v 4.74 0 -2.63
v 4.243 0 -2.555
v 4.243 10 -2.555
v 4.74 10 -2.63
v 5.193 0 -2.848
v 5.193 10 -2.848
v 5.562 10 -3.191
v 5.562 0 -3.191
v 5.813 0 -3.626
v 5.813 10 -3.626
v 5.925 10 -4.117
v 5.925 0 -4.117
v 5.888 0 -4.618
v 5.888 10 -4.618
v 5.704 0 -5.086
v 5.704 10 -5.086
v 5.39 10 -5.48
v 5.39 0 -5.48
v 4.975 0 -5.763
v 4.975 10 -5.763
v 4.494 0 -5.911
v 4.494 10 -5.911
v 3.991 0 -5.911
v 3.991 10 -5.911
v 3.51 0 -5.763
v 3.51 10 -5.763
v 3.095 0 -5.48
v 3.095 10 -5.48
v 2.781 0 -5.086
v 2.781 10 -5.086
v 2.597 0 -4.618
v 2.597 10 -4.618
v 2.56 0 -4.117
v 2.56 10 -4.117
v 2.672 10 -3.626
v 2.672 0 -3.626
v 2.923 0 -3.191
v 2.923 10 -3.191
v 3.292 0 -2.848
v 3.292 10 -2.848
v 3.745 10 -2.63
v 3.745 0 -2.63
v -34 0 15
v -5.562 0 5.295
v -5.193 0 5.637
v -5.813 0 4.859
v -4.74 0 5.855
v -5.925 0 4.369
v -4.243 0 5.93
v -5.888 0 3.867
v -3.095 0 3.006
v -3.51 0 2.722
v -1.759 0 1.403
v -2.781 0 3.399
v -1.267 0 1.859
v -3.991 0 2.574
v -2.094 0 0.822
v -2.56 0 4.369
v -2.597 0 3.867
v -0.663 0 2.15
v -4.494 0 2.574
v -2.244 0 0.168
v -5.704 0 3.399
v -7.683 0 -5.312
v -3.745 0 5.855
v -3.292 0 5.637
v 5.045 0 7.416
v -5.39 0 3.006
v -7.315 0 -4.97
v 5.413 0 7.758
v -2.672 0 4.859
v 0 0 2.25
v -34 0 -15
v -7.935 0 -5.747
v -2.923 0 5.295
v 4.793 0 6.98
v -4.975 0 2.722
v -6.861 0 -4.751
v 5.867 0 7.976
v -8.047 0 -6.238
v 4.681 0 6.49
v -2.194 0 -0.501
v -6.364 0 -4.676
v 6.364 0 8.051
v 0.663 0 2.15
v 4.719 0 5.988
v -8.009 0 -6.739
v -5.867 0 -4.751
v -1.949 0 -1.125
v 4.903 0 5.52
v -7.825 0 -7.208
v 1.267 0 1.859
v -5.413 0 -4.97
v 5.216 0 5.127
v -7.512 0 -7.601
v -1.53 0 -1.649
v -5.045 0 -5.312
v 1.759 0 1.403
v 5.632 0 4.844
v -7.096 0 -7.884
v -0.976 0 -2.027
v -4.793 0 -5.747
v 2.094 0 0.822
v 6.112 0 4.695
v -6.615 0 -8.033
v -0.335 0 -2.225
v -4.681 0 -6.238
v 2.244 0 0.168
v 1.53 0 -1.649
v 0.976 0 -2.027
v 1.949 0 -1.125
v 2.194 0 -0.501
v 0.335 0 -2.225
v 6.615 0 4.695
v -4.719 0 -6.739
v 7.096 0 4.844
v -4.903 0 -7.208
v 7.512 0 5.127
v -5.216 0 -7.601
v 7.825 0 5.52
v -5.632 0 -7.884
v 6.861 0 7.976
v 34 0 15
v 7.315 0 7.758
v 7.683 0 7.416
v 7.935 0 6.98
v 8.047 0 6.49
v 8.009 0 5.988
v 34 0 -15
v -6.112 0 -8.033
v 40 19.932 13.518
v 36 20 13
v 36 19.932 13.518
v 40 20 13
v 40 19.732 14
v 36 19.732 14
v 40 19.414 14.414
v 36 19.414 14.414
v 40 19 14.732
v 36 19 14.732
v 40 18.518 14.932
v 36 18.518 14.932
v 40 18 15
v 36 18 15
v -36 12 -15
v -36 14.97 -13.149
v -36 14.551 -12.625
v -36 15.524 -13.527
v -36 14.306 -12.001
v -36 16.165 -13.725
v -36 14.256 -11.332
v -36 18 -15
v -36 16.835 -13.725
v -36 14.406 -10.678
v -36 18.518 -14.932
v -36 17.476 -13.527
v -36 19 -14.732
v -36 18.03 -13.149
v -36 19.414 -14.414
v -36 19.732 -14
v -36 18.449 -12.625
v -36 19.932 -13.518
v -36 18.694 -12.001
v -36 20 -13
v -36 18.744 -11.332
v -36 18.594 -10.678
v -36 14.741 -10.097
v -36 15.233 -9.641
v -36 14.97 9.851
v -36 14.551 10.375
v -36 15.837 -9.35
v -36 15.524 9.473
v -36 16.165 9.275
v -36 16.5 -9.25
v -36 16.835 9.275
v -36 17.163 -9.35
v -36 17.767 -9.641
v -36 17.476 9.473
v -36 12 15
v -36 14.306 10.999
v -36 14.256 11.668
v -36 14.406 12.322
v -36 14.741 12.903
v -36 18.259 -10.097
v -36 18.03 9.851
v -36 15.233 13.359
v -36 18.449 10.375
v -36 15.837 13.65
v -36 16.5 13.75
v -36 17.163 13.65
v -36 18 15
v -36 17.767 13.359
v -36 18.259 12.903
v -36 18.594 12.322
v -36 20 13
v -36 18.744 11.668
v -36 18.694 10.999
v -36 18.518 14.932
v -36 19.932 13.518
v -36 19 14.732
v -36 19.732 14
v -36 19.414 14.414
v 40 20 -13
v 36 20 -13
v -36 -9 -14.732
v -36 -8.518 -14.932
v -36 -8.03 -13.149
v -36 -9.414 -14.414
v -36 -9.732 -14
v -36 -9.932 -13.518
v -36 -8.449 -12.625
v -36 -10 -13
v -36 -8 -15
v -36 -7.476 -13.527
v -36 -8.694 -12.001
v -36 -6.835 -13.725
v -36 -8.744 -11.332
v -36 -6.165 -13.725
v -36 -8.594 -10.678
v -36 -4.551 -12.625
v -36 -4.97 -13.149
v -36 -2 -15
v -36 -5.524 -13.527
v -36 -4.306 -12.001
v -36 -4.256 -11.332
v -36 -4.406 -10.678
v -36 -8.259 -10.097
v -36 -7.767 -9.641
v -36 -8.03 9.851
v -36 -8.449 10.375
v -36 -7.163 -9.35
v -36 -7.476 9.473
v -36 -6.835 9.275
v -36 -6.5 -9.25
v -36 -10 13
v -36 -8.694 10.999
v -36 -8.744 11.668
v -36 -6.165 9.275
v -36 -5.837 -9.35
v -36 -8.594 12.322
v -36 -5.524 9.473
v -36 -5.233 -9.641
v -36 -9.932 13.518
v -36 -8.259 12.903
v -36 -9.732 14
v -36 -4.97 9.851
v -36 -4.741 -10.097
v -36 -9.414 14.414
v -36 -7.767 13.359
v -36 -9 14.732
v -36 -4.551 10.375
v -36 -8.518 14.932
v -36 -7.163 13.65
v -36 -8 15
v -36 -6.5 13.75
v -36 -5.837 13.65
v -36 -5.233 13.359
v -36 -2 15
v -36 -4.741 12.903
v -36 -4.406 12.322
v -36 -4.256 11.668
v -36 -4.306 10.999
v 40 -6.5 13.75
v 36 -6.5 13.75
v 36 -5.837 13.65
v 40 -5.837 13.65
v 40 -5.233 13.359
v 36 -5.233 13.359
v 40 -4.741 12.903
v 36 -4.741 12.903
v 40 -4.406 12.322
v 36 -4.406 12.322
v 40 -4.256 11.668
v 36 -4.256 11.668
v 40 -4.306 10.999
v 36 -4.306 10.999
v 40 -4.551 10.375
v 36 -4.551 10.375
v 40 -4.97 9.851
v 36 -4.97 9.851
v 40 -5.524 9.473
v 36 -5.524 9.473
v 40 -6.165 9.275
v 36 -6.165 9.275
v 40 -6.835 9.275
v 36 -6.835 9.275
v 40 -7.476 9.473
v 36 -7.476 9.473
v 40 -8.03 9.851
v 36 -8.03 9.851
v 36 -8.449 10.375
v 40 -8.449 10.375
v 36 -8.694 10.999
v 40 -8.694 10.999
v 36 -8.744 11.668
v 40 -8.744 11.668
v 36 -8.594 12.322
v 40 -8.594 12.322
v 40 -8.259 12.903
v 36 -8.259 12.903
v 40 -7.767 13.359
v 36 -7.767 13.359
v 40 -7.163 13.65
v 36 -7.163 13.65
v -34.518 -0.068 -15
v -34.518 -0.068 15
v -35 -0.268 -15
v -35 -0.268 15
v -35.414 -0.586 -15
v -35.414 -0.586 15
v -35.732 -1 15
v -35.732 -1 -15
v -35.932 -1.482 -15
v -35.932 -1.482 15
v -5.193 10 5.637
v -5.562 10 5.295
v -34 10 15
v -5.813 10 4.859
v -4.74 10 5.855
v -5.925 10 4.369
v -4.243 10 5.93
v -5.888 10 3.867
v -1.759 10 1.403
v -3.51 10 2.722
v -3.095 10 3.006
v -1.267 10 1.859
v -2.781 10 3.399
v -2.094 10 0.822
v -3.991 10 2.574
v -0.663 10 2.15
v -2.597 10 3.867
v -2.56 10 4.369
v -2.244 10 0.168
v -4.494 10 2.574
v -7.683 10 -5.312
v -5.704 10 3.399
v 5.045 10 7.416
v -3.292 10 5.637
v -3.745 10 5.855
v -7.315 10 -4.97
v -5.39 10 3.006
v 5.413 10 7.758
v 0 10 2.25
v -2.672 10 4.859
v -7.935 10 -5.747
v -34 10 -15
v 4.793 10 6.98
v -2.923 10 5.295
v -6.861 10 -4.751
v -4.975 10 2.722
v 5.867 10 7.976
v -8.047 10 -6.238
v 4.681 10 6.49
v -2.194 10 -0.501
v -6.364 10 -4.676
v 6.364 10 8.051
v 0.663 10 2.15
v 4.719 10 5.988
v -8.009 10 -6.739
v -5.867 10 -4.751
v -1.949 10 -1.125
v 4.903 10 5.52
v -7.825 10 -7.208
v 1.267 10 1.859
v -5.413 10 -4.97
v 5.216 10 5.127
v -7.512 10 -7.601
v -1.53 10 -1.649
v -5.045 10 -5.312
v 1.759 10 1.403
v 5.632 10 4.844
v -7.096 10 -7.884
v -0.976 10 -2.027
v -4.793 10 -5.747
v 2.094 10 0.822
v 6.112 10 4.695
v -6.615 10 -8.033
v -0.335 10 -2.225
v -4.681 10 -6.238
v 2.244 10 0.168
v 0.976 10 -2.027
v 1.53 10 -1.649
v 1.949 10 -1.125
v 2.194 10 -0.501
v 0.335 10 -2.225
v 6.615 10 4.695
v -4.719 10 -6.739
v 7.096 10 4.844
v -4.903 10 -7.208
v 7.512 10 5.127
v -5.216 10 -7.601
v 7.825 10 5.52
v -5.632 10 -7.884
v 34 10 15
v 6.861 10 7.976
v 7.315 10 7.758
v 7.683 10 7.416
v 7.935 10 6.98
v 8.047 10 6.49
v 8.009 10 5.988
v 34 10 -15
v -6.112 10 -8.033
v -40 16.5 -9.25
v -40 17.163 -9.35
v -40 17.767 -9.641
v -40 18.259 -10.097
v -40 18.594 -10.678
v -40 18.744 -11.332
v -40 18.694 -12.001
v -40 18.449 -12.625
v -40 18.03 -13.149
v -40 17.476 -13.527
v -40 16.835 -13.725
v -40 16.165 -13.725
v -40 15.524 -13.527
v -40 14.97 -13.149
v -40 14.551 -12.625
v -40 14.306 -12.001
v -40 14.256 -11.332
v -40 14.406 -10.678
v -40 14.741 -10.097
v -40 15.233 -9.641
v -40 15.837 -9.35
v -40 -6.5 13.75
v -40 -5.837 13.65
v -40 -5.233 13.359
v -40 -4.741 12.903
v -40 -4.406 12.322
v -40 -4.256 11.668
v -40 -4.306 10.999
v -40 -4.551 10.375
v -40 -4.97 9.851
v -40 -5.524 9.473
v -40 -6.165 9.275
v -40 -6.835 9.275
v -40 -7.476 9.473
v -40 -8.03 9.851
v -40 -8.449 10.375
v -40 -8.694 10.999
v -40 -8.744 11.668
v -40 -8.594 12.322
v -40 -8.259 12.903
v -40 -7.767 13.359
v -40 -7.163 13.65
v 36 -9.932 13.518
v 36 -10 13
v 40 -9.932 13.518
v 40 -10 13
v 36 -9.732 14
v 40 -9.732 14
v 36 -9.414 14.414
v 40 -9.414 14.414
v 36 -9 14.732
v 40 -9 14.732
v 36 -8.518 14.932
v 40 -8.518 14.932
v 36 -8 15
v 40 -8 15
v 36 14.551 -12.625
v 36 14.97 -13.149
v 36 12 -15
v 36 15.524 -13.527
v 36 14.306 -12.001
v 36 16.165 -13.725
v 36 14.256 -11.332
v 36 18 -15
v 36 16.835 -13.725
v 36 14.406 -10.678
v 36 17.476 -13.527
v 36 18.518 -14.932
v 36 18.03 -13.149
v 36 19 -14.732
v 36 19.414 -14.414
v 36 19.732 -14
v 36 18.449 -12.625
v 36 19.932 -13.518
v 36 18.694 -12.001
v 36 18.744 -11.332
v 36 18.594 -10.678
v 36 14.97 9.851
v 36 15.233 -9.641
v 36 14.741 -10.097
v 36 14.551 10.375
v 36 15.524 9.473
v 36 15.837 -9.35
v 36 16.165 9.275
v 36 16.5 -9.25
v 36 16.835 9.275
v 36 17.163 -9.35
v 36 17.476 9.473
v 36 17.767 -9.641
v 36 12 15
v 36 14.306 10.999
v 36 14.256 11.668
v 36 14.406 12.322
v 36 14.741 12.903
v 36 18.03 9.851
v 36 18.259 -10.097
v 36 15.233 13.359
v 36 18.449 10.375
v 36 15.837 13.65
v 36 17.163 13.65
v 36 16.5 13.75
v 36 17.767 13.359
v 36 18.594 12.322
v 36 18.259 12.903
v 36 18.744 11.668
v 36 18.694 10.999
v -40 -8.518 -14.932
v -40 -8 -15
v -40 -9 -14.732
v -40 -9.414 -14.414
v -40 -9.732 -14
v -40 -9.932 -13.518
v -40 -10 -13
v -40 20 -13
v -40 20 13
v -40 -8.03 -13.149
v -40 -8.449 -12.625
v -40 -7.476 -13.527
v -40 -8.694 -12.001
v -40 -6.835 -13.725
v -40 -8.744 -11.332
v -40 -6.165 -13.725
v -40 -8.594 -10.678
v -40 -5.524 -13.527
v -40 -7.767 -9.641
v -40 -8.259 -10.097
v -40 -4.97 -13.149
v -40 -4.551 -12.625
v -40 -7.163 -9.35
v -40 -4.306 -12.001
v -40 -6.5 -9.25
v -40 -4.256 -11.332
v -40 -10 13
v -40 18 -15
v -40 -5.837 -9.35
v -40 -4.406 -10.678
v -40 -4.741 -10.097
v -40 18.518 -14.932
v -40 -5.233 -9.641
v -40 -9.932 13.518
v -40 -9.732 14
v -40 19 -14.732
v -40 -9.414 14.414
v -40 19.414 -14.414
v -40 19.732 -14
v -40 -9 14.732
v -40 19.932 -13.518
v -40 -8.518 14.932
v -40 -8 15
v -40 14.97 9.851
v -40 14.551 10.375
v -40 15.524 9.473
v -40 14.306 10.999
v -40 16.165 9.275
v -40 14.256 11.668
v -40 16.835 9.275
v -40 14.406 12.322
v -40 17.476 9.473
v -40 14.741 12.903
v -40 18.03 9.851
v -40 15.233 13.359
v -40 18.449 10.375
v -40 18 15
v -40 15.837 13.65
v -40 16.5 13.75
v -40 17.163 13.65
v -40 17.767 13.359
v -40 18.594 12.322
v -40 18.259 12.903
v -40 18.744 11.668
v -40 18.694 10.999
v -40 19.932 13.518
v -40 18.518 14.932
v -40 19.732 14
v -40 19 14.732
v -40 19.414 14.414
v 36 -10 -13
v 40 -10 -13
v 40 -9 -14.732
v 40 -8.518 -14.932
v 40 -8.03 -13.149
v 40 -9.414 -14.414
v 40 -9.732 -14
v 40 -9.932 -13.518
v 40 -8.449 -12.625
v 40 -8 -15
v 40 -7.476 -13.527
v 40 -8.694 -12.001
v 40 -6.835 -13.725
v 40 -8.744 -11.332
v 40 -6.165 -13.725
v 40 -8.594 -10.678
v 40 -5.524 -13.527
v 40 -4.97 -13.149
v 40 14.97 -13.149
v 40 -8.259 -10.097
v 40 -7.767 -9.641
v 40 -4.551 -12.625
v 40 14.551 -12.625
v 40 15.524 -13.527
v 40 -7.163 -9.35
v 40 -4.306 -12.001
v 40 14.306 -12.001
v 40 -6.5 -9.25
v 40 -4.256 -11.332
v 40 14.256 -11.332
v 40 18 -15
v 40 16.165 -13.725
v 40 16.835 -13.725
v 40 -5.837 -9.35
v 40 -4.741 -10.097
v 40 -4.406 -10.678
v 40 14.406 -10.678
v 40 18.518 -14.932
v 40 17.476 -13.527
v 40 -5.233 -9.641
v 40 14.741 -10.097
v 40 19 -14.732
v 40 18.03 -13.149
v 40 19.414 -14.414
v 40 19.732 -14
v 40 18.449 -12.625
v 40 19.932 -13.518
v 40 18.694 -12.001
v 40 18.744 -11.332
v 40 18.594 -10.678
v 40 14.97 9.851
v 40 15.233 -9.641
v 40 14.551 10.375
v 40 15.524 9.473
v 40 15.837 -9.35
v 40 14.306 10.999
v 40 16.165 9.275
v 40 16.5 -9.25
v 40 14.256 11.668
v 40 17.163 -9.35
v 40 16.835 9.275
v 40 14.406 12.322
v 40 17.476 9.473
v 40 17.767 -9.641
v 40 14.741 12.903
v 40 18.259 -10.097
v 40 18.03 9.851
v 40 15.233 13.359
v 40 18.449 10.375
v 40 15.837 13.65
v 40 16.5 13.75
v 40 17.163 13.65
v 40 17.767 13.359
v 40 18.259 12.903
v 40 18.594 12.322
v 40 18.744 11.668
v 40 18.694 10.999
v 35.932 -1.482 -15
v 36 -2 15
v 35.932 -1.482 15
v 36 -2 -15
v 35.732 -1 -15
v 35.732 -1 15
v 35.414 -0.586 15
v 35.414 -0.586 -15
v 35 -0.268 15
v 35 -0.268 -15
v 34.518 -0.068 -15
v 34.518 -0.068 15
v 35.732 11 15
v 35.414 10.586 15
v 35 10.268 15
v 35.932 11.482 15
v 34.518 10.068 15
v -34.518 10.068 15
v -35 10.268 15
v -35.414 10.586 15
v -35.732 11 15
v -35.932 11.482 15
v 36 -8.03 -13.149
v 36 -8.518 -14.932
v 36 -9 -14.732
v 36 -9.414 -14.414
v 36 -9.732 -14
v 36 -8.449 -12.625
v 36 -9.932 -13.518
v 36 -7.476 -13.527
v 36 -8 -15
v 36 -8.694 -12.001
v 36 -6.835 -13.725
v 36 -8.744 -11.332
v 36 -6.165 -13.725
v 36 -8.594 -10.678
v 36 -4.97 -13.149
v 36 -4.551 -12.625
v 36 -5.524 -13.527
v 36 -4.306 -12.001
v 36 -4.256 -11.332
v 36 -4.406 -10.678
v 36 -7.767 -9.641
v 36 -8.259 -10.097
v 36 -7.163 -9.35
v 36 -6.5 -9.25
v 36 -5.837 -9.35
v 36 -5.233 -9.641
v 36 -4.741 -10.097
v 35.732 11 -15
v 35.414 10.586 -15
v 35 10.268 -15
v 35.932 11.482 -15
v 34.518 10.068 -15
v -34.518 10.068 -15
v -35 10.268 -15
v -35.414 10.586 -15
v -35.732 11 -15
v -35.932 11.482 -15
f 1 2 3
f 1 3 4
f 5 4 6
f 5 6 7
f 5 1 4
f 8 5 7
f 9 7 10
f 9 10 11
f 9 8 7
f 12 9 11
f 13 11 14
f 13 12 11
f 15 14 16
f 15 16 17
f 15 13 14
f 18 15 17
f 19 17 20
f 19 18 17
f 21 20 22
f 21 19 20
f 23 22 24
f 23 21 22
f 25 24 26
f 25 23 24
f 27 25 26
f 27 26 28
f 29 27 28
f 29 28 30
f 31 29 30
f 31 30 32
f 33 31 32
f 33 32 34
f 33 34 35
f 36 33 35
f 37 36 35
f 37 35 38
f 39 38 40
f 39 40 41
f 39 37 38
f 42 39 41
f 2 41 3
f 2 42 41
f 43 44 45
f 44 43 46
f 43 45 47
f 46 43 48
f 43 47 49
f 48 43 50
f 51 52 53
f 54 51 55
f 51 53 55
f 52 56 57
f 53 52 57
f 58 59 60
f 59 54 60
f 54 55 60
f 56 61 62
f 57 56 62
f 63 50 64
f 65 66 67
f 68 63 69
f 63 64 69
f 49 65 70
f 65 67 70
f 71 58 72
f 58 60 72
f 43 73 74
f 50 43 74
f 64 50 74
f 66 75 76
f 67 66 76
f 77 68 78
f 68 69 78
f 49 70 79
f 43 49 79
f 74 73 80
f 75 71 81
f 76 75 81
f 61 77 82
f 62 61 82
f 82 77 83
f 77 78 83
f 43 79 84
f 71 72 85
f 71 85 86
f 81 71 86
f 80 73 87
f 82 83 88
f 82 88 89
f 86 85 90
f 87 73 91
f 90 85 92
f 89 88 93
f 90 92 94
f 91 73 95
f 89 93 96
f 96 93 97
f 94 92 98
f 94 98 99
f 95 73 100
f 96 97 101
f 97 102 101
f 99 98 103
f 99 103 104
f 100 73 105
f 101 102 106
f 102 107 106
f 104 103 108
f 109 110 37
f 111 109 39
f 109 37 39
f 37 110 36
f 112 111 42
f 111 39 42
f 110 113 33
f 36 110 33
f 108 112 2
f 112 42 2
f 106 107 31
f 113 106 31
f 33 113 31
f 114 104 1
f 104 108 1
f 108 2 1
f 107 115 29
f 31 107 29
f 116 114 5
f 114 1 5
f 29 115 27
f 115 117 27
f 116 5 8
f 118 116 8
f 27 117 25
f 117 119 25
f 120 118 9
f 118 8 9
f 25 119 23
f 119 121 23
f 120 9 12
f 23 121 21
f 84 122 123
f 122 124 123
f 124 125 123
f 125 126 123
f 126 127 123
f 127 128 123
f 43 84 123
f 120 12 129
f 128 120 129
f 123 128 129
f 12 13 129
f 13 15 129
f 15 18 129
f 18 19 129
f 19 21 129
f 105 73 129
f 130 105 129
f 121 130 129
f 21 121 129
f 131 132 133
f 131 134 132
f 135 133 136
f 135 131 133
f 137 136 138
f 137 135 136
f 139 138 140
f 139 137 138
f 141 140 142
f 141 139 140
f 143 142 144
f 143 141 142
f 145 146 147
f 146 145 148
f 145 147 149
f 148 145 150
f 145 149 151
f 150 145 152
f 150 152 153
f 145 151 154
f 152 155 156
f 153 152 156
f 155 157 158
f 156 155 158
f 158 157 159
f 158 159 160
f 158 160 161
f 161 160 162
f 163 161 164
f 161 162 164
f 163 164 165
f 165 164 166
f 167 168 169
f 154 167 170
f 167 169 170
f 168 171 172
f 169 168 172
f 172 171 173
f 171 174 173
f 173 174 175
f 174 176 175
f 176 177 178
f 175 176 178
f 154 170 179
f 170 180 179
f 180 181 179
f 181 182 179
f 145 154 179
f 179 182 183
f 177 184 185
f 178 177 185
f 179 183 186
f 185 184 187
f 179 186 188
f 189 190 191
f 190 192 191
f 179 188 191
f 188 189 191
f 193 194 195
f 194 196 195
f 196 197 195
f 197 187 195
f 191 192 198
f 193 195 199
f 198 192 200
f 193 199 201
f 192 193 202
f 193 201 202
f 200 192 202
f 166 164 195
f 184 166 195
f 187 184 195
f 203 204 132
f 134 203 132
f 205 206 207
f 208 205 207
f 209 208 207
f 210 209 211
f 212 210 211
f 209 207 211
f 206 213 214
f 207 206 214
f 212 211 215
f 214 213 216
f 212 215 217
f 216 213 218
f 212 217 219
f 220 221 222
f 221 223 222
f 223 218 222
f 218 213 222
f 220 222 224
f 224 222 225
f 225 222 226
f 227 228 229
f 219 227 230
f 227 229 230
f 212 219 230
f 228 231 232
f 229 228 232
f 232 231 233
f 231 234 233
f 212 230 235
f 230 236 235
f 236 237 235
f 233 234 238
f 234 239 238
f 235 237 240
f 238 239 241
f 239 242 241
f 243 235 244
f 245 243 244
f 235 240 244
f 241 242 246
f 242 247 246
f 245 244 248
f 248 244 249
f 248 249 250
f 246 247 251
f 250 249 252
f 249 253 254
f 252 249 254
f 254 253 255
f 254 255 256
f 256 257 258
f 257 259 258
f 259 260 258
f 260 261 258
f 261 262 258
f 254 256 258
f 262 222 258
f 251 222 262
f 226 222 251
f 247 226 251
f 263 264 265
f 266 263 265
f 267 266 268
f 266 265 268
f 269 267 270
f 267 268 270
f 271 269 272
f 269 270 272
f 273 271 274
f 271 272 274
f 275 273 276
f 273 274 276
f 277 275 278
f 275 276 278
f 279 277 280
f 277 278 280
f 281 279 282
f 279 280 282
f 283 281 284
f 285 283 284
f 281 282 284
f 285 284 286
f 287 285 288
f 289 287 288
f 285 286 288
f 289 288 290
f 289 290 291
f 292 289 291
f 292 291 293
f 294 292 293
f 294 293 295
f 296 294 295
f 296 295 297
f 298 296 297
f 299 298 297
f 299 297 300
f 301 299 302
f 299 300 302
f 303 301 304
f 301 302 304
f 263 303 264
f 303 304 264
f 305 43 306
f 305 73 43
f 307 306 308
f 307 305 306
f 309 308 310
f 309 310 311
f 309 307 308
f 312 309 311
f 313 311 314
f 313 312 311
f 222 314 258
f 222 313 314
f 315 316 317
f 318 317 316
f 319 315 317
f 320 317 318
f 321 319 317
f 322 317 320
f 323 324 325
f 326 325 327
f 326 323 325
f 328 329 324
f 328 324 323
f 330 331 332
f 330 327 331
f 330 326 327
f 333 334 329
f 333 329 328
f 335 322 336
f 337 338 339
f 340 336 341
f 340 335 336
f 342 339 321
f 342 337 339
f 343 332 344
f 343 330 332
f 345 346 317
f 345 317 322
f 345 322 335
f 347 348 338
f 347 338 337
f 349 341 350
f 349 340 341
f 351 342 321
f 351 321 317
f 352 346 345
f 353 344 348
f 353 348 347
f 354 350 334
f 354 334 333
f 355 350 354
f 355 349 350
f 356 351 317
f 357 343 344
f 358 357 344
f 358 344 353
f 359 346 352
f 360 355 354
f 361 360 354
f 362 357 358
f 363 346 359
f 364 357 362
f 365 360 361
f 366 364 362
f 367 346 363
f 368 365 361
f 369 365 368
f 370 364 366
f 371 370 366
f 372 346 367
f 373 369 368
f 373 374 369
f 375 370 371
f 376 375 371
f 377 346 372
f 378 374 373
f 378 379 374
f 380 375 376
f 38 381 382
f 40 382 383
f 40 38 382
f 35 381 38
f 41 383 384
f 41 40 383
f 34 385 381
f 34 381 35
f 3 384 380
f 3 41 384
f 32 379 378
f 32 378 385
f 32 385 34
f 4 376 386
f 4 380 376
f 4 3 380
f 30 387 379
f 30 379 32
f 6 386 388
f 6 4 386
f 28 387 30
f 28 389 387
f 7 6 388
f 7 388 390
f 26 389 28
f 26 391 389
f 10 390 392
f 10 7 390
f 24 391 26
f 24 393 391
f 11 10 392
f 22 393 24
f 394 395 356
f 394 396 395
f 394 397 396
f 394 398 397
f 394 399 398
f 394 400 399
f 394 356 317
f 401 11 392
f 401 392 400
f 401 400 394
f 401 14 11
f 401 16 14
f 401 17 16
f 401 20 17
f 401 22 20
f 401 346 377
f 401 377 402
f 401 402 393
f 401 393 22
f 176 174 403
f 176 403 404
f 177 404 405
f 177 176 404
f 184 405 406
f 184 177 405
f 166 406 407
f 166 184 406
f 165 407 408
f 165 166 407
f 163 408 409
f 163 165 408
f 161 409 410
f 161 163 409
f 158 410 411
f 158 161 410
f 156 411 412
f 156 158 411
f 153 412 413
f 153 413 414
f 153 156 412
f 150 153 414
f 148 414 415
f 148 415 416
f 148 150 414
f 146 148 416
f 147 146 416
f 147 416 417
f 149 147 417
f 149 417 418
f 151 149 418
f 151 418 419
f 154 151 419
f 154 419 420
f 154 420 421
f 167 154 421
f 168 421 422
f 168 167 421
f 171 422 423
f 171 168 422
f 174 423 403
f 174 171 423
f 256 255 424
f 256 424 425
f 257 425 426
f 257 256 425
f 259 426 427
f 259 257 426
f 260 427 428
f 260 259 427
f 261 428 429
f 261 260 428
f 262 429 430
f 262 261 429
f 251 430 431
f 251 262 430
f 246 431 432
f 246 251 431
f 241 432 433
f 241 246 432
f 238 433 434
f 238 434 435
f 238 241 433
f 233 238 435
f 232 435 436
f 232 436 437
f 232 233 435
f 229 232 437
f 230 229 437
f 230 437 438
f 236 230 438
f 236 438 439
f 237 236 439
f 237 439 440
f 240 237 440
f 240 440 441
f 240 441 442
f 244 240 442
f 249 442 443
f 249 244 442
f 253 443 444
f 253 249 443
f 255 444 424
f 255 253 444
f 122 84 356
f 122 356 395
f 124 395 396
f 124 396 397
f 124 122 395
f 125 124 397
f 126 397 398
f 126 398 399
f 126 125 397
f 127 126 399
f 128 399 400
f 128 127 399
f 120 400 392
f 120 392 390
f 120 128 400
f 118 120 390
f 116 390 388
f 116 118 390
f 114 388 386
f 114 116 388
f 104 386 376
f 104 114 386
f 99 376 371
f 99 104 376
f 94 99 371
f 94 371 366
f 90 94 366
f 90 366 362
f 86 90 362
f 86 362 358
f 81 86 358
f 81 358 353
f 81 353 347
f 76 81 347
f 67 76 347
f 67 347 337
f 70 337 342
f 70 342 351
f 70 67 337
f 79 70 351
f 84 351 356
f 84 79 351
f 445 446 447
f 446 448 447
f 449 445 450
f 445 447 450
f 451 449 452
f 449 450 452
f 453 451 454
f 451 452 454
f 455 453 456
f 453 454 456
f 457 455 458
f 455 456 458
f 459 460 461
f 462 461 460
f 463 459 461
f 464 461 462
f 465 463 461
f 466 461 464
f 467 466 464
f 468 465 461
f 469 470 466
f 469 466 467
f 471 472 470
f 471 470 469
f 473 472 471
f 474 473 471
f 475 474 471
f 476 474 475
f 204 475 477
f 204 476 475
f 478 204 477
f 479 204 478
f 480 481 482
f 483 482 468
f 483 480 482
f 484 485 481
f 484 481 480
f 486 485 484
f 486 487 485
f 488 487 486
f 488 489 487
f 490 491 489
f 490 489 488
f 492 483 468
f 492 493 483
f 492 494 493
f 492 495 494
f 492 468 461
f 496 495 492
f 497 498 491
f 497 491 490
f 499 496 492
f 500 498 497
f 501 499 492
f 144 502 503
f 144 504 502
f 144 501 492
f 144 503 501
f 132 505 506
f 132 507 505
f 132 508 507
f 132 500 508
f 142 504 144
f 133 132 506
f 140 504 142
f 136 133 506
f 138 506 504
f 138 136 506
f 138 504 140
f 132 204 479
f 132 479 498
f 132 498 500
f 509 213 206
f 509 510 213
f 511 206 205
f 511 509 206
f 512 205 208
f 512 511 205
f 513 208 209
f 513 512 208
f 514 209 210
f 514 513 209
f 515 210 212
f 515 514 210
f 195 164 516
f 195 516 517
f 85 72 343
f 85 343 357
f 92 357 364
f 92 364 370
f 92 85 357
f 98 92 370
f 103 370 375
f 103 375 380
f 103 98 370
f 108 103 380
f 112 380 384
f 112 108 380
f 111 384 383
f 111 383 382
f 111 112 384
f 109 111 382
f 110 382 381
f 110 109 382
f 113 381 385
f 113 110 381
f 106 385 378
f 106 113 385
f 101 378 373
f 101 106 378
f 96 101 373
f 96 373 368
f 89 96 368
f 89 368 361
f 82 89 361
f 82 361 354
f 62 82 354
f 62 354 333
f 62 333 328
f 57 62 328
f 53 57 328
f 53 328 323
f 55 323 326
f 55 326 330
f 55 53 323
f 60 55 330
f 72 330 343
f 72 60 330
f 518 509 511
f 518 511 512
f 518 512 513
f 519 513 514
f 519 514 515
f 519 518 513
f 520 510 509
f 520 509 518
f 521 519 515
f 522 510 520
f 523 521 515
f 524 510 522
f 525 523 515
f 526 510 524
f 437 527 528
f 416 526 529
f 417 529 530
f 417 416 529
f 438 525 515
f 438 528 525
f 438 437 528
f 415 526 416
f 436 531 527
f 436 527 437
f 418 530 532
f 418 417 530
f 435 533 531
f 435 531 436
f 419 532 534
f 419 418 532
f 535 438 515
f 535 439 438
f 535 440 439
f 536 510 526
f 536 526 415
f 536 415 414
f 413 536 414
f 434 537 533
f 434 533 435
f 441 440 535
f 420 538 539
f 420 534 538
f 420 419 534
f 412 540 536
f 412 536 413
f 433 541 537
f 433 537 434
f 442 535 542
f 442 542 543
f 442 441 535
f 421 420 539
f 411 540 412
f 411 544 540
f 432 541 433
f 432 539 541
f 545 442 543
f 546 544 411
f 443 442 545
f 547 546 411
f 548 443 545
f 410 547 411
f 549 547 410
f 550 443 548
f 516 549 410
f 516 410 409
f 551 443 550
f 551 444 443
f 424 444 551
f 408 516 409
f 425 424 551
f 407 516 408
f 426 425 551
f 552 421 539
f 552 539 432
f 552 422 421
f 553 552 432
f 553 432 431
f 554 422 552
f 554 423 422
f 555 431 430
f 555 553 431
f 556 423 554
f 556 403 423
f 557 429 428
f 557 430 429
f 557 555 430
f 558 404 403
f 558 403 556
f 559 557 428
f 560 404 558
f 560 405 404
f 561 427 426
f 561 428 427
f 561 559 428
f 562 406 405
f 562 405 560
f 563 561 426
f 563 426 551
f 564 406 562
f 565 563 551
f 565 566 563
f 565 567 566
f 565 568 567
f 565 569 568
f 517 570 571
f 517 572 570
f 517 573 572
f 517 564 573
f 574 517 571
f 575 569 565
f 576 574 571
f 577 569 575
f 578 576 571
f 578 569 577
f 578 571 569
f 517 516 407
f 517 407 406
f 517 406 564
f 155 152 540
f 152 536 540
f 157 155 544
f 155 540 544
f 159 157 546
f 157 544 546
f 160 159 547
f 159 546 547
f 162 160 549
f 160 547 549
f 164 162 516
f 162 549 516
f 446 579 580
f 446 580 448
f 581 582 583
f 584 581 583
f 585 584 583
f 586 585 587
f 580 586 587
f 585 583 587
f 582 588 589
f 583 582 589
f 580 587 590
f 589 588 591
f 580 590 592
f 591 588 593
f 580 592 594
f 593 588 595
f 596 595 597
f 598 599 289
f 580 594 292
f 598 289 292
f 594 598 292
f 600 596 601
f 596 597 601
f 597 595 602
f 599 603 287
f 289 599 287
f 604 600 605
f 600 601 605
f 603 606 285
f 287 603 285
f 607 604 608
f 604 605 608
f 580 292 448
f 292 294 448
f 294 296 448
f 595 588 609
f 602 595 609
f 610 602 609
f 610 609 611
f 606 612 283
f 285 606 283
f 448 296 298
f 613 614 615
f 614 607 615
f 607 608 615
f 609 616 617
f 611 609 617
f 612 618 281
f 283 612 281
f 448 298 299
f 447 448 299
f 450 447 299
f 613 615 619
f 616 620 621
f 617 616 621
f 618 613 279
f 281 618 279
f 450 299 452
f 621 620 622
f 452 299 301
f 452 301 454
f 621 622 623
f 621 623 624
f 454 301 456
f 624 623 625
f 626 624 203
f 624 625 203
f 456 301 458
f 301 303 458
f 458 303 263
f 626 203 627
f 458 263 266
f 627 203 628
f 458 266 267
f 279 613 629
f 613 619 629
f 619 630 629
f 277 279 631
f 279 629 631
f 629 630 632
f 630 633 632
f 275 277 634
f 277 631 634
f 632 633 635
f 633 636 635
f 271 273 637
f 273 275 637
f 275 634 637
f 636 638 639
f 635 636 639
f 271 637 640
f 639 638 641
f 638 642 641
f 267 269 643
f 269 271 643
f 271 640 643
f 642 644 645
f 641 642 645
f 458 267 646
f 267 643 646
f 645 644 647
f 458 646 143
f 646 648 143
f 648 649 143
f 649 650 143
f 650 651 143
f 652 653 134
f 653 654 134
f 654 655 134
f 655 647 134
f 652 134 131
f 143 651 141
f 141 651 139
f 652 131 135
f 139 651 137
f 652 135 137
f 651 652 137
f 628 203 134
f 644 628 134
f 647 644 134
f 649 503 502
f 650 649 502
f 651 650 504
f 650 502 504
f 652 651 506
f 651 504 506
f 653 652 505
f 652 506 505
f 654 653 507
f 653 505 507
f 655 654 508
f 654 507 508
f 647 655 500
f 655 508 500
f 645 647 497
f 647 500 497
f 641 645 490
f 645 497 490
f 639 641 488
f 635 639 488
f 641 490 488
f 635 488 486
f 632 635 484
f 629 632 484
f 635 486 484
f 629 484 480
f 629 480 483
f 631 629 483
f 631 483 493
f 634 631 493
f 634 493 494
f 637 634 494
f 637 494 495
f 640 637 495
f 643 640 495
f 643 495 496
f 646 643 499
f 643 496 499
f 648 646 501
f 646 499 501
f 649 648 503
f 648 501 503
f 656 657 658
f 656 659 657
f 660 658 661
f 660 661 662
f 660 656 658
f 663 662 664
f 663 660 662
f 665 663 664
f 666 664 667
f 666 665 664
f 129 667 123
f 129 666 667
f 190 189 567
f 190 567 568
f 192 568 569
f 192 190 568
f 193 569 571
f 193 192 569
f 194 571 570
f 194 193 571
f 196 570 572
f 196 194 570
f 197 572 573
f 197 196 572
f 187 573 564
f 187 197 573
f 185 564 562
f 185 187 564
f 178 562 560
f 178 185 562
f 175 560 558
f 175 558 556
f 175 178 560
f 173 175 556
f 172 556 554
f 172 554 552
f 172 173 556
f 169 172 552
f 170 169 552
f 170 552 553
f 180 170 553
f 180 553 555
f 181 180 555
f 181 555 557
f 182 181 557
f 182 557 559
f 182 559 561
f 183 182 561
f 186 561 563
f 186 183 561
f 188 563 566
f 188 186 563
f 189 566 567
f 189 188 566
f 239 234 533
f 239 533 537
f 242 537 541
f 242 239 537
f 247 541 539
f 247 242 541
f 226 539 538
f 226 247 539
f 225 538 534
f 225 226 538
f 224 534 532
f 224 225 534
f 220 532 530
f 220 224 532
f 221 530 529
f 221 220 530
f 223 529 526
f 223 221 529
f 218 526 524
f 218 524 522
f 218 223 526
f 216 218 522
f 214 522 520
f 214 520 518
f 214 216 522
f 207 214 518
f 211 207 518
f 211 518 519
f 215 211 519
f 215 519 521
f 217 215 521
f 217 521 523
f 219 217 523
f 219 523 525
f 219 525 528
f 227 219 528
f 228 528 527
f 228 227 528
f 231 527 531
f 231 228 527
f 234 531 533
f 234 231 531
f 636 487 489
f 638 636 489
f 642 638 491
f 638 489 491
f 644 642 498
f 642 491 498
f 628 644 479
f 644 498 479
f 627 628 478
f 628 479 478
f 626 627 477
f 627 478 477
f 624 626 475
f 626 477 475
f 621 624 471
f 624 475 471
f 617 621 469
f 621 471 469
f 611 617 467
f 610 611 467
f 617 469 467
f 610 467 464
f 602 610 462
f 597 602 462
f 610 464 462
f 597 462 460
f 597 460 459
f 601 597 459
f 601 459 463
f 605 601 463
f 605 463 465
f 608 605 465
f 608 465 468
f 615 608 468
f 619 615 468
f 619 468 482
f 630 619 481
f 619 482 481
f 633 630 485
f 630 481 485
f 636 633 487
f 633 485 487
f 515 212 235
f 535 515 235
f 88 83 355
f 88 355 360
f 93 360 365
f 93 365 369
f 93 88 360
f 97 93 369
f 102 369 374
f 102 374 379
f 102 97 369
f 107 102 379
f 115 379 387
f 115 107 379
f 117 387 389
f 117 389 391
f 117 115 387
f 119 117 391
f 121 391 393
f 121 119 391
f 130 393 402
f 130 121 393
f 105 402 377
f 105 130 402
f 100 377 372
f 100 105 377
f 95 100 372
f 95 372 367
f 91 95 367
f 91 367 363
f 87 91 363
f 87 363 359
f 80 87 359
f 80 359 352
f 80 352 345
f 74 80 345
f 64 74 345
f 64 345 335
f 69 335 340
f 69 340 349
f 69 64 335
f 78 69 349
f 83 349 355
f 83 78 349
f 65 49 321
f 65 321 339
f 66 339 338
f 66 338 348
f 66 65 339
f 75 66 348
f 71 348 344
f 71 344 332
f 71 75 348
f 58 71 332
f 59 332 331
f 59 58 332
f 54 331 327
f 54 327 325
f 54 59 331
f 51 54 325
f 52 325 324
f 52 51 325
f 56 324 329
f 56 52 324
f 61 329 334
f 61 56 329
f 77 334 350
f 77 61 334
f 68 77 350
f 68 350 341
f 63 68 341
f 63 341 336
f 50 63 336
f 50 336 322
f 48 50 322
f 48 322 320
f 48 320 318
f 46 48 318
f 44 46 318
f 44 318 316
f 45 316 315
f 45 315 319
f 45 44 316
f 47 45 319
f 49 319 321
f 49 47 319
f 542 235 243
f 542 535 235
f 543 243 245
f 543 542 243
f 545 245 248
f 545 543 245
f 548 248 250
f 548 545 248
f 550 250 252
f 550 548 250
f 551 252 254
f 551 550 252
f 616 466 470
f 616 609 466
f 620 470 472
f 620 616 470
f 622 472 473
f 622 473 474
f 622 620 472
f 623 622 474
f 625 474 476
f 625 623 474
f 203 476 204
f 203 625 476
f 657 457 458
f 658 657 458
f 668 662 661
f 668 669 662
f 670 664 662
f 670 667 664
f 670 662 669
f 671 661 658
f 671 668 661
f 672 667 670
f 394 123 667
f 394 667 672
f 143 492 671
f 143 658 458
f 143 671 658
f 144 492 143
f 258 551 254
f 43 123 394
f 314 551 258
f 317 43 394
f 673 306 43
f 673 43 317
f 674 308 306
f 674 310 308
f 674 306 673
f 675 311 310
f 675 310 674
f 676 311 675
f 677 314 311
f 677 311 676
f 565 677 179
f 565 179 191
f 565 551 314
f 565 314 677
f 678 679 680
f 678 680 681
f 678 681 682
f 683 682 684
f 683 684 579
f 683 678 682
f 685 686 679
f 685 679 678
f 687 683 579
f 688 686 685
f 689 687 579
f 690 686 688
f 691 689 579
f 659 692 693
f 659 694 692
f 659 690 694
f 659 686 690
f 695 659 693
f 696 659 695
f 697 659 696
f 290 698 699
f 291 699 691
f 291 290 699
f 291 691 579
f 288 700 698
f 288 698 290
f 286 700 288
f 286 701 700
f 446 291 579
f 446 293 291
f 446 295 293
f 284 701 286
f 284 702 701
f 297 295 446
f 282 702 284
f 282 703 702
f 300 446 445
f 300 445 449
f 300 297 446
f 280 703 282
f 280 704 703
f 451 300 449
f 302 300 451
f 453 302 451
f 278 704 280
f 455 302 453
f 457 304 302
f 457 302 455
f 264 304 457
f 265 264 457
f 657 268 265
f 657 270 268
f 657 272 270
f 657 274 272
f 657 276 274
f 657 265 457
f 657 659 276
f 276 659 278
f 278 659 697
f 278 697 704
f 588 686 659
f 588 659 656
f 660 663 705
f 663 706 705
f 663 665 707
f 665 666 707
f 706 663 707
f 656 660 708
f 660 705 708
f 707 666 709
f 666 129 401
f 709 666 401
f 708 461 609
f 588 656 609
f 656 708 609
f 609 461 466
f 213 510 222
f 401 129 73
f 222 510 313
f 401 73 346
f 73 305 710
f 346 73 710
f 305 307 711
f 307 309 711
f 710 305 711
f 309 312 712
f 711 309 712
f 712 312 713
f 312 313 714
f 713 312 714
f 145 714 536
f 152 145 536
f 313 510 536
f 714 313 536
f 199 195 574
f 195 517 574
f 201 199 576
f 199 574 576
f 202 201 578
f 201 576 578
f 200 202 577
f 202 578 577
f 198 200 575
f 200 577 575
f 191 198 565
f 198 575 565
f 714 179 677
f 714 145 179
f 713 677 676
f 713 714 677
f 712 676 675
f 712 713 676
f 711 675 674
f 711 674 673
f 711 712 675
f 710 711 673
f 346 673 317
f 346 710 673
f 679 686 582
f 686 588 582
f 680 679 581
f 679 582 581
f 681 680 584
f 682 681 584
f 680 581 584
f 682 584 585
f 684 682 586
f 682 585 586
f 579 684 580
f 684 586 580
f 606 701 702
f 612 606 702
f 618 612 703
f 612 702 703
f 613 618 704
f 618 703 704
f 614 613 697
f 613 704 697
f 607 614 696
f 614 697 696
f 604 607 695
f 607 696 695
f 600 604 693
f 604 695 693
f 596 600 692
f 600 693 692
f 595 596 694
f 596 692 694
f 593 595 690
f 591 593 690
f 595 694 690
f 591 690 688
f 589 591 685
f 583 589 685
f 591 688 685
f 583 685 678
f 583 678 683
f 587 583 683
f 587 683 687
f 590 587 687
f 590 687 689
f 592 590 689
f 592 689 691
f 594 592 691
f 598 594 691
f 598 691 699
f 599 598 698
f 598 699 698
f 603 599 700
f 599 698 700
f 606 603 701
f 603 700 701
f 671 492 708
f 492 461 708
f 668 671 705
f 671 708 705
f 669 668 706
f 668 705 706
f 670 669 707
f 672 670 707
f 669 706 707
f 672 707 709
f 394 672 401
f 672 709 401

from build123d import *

# Parameters (mm, degrees)
SKETCH2_W           = 72
SKETCH2_H           = 30
SKETCH2_R           = 2.25
SKETCH2_R_2         = 1.6875
BOSS_EXTRUDE1_DEPTH = 10
SKETCH3_W           = 30
SKETCH3_H           = 30
SKETCH3_R           = 2.25
BOSS_EXTRUDE2_DEPTH = 4
FILLET1_R           = 2
FILLET2_R           = 2


with BuildPart() as part:
    # Sketch2 → Boss-Extrude1 (new body)
    with BuildSketch(Plane(origin=(0, 0, 0), x_dir=(1, 0, 0), z_dir=(0, 1, 0))):
        Rectangle(SKETCH2_W, SKETCH2_H)
        with Locations(Location((0, 0, 0), (0, 0, 270))):
            Circle(SKETCH2_R, mode=Mode.SUBTRACT)
        with Locations(Location((-6.363961031, 6.363961031, 0), (0, 0, 270))):
            Circle(SKETCH2_R_2, mode=Mode.SUBTRACT)
        with Locations(Location((6.363961031, -6.363961031, 0), (0, 0, 270))):
            Circle(SKETCH2_R_2, mode=Mode.SUBTRACT)
        with Locations(Location((4.242640687, 4.242640687, 0), (0, 0, 270))):
            Circle(SKETCH2_R_2, mode=Mode.SUBTRACT)
        with Locations(Location((-4.242640687, -4.242640687, 0), (0, 0, 270))):
            Circle(SKETCH2_R_2, mode=Mode.SUBTRACT)
    extrude(amount=BOSS_EXTRUDE1_DEPTH)

    # Sketch3 → Boss-Extrude2 (add)
    with BuildSketch(Plane.ZY.offset(36)):
        with Locations((0, 5)):
            Rectangle(SKETCH3_W, SKETCH3_H)
        with Locations((-11.5, 16.5)):
            Circle(SKETCH3_R, mode=Mode.SUBTRACT)
        with Locations((-11.5, -6.5)):
            Circle(SKETCH3_R, mode=Mode.SUBTRACT)
        with Locations((11.5, -6.5)):
            Circle(SKETCH3_R, mode=Mode.SUBTRACT)
        with Locations((11.5, 16.5)):
            Circle(SKETCH3_R, mode=Mode.SUBTRACT)
    boss_extrude2 = extrude(amount=BOSS_EXTRUDE2_DEPTH)

    # Mirror1: Boss-Extrude2 across plane
    add(boss_extrude2.mirror(Plane(origin=(0, 0, 0), x_dir=(0, 0, 1), z_dir=(1, 0, 0))))

    # Fillet1
    fillet1_edges = [part.edges().sort_by_distance(p)[0] for p in [
        (-36, 10, 0),
        (-36, 0, 0),
        (36, 0, 0),
        (36, 10, 0),
    ]]
    fillet(fillet1_edges, radius=FILLET1_R)

    # Fillet2
    fillet2_edges = [part.edges().sort_by_distance(p)[0] for p in [
        (-38, 20, 15),
        (-38, 20, -15),
        (-38, -10, -15),
        (-38, -10, 15),
        (38, 20, -15),
        (38, 20, 15),
        (38, -10, 15),
        (38, -10, -15),
    ]]
    fillet(fillet2_edges, radius=FILLET2_R)


solid = part.part
